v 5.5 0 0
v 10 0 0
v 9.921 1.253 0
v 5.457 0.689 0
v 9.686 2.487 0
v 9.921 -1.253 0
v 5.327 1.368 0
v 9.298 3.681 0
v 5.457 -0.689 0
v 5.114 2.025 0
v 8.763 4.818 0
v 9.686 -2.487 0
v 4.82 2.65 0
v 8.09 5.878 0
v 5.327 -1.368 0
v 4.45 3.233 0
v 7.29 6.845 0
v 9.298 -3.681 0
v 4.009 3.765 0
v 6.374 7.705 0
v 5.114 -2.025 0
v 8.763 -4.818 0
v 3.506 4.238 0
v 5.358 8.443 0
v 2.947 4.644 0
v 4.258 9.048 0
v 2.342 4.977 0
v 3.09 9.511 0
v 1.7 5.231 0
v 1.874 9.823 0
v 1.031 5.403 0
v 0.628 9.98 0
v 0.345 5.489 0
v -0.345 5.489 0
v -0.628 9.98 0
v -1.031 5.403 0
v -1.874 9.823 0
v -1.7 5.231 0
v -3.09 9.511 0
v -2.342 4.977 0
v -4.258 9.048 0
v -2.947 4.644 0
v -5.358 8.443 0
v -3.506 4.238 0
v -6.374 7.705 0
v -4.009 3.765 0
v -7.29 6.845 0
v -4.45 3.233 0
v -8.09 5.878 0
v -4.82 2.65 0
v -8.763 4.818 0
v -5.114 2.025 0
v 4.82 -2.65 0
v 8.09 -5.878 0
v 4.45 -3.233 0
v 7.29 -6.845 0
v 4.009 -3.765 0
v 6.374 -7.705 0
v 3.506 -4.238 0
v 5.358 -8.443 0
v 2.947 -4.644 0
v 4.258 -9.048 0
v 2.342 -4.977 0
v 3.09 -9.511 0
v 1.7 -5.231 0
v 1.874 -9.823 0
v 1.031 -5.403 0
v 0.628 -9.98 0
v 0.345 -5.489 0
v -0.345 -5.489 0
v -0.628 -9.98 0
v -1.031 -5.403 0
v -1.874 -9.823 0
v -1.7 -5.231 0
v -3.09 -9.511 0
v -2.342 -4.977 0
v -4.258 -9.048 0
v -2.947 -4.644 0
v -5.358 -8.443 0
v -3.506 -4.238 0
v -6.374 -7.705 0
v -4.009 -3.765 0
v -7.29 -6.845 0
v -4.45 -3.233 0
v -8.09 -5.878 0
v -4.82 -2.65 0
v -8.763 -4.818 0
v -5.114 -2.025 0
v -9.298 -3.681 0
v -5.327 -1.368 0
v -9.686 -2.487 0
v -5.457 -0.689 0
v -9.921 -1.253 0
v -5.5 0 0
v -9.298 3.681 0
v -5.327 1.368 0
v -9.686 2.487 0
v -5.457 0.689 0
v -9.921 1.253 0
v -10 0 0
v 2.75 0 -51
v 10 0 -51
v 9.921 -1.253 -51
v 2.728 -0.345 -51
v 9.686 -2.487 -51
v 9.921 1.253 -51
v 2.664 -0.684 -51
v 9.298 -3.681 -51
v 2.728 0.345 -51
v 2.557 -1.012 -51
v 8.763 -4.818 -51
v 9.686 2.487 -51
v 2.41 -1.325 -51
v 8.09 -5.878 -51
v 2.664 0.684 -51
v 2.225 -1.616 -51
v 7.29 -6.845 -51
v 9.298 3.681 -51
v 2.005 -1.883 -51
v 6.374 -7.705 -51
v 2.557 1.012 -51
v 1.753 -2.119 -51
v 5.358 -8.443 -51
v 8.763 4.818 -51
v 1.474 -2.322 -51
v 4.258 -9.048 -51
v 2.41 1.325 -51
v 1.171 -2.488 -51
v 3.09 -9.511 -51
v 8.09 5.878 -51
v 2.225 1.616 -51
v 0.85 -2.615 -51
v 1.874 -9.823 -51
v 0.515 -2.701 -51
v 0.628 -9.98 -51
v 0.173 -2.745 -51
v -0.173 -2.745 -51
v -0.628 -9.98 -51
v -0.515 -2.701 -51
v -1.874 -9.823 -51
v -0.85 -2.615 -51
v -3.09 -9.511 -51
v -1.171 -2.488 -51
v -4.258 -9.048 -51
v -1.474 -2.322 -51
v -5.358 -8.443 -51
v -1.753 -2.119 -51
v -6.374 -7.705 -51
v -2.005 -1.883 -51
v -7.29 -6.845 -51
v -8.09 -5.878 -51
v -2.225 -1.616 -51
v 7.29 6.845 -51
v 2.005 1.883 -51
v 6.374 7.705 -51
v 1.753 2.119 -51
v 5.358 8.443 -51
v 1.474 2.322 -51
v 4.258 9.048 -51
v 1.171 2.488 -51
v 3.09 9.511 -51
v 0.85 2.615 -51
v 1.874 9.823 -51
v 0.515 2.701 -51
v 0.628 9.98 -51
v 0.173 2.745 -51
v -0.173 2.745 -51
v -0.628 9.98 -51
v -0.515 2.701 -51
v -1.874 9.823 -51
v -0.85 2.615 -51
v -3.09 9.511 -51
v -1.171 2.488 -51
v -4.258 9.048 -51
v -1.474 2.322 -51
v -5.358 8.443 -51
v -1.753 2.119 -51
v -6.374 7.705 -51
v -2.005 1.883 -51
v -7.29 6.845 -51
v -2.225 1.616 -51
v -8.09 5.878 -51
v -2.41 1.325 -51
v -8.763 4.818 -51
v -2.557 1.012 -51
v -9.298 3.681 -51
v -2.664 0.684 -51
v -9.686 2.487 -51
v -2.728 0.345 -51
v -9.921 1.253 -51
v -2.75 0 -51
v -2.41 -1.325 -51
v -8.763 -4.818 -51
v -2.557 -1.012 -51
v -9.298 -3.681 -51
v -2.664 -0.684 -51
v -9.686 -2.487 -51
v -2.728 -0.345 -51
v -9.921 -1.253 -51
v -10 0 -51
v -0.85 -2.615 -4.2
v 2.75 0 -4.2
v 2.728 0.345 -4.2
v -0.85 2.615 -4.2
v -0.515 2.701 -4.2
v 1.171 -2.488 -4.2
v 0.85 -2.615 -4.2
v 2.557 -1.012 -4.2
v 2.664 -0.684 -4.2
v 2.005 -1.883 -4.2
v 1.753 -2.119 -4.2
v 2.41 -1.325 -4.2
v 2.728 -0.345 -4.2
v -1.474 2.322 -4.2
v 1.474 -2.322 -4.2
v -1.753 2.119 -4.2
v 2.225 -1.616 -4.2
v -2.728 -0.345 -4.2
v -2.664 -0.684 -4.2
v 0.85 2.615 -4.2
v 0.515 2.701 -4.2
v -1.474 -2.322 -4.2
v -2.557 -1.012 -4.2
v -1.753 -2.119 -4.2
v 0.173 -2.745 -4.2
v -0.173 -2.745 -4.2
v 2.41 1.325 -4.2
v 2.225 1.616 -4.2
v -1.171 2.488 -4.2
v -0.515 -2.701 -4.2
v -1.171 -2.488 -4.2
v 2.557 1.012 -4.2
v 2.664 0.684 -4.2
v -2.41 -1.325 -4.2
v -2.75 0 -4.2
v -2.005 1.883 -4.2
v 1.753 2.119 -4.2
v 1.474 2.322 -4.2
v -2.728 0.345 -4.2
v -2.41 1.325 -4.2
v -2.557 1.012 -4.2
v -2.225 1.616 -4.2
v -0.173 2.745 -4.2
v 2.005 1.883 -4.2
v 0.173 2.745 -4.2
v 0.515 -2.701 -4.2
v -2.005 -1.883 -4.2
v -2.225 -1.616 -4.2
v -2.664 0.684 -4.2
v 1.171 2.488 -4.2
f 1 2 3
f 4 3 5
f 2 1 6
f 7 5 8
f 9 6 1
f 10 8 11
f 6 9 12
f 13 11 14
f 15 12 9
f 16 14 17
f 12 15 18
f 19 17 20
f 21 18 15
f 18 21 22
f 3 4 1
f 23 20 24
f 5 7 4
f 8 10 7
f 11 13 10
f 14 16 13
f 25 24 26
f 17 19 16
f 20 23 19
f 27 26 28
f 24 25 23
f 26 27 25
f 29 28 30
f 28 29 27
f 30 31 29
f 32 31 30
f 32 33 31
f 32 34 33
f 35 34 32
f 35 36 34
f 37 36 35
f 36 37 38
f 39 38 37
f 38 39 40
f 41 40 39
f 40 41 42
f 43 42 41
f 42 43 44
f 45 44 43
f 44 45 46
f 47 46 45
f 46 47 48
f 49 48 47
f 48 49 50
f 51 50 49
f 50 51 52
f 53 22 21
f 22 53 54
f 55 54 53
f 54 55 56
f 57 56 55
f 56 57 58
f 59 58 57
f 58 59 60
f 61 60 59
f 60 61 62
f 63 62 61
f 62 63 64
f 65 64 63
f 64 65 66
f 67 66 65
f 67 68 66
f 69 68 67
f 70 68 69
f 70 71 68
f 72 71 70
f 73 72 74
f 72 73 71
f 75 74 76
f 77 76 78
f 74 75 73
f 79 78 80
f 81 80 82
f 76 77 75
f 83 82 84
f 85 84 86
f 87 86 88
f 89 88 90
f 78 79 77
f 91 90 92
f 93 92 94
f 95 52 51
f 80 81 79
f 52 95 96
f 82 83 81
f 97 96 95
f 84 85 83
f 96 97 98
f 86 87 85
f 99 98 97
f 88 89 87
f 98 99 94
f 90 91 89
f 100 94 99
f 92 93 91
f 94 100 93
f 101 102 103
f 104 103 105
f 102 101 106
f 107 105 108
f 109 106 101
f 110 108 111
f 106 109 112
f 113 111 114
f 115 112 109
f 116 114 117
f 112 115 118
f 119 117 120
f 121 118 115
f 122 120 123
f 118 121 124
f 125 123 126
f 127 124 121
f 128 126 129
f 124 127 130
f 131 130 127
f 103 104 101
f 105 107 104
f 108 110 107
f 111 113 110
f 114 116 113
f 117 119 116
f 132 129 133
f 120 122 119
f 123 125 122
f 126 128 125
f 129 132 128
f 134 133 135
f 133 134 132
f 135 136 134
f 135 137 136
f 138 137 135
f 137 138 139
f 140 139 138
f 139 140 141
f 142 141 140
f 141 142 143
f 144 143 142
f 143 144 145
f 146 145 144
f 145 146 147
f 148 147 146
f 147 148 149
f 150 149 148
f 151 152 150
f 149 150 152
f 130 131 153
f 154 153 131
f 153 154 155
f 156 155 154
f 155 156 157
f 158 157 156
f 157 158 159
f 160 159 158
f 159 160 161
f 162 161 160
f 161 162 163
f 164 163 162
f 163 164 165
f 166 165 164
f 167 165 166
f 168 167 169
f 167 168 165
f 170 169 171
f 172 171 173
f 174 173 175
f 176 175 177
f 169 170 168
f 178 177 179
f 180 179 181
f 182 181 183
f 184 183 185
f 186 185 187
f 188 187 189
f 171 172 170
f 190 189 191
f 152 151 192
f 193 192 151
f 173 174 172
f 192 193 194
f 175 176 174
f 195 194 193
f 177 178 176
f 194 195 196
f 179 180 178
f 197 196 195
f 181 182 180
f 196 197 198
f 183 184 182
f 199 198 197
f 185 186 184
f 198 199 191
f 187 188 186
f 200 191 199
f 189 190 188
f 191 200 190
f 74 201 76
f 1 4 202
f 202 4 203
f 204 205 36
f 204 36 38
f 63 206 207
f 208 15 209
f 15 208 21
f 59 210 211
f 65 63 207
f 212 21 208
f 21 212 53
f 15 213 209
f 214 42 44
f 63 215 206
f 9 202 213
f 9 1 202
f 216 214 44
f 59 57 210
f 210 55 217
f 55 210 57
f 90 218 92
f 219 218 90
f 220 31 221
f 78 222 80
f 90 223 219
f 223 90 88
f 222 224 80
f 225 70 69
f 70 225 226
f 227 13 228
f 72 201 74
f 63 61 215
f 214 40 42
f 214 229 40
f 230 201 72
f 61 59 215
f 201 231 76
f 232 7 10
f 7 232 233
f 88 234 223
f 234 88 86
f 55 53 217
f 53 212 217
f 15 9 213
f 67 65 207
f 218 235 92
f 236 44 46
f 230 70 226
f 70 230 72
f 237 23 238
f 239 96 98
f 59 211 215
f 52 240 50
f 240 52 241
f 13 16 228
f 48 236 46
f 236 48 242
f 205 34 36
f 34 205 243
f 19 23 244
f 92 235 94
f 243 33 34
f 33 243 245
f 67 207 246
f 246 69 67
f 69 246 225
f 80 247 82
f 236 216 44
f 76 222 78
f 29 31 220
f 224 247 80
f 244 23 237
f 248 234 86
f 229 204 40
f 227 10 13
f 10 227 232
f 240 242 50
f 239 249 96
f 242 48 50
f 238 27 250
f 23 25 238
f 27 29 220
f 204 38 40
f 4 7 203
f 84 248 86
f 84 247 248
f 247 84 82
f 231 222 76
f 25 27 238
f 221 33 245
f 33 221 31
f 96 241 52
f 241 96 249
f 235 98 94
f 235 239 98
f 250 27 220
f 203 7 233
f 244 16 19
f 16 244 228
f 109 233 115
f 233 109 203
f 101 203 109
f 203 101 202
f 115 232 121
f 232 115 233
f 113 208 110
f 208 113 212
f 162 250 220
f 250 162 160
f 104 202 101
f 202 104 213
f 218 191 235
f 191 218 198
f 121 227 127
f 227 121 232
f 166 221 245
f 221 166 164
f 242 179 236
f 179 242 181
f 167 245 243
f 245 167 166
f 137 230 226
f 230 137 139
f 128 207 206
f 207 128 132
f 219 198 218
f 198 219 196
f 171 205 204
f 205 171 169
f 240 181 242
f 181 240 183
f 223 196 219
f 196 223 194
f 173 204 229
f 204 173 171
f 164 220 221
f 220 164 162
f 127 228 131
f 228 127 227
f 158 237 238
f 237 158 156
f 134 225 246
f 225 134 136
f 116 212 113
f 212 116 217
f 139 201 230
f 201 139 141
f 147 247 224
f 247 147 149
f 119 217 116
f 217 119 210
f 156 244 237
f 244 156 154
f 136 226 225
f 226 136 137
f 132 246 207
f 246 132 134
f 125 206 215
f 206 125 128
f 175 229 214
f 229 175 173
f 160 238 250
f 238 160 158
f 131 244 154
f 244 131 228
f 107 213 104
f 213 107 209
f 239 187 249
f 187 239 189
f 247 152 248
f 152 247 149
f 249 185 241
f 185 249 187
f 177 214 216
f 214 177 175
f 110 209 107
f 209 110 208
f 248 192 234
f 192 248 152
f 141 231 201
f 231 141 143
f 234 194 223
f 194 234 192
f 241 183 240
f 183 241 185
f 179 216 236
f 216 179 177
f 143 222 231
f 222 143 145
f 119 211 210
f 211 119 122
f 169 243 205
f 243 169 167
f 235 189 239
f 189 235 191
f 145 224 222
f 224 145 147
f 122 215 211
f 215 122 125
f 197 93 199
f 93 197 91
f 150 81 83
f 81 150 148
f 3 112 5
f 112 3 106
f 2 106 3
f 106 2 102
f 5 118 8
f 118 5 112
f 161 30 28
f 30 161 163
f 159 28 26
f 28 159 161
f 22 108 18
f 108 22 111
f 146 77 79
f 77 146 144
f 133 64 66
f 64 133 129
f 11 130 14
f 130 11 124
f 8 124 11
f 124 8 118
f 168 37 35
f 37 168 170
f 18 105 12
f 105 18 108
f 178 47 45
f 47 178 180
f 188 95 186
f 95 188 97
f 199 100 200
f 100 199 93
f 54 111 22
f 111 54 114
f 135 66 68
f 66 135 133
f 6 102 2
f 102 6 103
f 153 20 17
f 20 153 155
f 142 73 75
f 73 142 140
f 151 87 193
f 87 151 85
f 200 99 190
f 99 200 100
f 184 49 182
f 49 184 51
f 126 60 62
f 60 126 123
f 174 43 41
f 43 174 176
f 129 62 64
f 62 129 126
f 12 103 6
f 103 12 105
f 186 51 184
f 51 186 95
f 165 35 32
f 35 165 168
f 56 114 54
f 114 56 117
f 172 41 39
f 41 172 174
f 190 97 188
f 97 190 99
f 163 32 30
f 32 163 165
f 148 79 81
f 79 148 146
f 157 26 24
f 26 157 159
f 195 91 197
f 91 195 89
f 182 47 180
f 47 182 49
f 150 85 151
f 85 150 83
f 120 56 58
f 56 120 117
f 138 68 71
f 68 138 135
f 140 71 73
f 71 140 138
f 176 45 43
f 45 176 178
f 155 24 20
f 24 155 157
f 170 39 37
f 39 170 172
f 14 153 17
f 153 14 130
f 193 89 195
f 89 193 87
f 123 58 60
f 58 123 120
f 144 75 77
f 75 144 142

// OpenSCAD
$fn = 50;


difference() {
	union() {
		translate(v = [0, 0, -51.0000000000]) {
			cylinder(h = 51, r = 10.0000000000);
		}
		cylinder(h = 0, r = 20.0000000000);
	}
	union() {
		translate(v = [0, 0, 0]) {
			rotate(a = [0, 0, 0]) {
				difference() {
					union() {
						#translate(v = [0, 0, -51.0000000000]) {
							cylinder(h = 51, r = 2.2500000000);
						}
						#translate(v = [0, 0, -4.2000000000]) {
							cylinder(h = 4.2000000000, r = 10.0000000000, r1 = 2.7500000000, r2 = 5.5000000000);
						}
						#translate(v = [0, 0, -51.0000000000]) {
							cylinder(h = 51, r = 2.7500000000);
						}
						#translate(v = [0, 0, -51.0000000000]) {
							cylinder(h = 51, r = 2.2500000000);
						}
					}
					union();
				}
			}
		}
	}
}
